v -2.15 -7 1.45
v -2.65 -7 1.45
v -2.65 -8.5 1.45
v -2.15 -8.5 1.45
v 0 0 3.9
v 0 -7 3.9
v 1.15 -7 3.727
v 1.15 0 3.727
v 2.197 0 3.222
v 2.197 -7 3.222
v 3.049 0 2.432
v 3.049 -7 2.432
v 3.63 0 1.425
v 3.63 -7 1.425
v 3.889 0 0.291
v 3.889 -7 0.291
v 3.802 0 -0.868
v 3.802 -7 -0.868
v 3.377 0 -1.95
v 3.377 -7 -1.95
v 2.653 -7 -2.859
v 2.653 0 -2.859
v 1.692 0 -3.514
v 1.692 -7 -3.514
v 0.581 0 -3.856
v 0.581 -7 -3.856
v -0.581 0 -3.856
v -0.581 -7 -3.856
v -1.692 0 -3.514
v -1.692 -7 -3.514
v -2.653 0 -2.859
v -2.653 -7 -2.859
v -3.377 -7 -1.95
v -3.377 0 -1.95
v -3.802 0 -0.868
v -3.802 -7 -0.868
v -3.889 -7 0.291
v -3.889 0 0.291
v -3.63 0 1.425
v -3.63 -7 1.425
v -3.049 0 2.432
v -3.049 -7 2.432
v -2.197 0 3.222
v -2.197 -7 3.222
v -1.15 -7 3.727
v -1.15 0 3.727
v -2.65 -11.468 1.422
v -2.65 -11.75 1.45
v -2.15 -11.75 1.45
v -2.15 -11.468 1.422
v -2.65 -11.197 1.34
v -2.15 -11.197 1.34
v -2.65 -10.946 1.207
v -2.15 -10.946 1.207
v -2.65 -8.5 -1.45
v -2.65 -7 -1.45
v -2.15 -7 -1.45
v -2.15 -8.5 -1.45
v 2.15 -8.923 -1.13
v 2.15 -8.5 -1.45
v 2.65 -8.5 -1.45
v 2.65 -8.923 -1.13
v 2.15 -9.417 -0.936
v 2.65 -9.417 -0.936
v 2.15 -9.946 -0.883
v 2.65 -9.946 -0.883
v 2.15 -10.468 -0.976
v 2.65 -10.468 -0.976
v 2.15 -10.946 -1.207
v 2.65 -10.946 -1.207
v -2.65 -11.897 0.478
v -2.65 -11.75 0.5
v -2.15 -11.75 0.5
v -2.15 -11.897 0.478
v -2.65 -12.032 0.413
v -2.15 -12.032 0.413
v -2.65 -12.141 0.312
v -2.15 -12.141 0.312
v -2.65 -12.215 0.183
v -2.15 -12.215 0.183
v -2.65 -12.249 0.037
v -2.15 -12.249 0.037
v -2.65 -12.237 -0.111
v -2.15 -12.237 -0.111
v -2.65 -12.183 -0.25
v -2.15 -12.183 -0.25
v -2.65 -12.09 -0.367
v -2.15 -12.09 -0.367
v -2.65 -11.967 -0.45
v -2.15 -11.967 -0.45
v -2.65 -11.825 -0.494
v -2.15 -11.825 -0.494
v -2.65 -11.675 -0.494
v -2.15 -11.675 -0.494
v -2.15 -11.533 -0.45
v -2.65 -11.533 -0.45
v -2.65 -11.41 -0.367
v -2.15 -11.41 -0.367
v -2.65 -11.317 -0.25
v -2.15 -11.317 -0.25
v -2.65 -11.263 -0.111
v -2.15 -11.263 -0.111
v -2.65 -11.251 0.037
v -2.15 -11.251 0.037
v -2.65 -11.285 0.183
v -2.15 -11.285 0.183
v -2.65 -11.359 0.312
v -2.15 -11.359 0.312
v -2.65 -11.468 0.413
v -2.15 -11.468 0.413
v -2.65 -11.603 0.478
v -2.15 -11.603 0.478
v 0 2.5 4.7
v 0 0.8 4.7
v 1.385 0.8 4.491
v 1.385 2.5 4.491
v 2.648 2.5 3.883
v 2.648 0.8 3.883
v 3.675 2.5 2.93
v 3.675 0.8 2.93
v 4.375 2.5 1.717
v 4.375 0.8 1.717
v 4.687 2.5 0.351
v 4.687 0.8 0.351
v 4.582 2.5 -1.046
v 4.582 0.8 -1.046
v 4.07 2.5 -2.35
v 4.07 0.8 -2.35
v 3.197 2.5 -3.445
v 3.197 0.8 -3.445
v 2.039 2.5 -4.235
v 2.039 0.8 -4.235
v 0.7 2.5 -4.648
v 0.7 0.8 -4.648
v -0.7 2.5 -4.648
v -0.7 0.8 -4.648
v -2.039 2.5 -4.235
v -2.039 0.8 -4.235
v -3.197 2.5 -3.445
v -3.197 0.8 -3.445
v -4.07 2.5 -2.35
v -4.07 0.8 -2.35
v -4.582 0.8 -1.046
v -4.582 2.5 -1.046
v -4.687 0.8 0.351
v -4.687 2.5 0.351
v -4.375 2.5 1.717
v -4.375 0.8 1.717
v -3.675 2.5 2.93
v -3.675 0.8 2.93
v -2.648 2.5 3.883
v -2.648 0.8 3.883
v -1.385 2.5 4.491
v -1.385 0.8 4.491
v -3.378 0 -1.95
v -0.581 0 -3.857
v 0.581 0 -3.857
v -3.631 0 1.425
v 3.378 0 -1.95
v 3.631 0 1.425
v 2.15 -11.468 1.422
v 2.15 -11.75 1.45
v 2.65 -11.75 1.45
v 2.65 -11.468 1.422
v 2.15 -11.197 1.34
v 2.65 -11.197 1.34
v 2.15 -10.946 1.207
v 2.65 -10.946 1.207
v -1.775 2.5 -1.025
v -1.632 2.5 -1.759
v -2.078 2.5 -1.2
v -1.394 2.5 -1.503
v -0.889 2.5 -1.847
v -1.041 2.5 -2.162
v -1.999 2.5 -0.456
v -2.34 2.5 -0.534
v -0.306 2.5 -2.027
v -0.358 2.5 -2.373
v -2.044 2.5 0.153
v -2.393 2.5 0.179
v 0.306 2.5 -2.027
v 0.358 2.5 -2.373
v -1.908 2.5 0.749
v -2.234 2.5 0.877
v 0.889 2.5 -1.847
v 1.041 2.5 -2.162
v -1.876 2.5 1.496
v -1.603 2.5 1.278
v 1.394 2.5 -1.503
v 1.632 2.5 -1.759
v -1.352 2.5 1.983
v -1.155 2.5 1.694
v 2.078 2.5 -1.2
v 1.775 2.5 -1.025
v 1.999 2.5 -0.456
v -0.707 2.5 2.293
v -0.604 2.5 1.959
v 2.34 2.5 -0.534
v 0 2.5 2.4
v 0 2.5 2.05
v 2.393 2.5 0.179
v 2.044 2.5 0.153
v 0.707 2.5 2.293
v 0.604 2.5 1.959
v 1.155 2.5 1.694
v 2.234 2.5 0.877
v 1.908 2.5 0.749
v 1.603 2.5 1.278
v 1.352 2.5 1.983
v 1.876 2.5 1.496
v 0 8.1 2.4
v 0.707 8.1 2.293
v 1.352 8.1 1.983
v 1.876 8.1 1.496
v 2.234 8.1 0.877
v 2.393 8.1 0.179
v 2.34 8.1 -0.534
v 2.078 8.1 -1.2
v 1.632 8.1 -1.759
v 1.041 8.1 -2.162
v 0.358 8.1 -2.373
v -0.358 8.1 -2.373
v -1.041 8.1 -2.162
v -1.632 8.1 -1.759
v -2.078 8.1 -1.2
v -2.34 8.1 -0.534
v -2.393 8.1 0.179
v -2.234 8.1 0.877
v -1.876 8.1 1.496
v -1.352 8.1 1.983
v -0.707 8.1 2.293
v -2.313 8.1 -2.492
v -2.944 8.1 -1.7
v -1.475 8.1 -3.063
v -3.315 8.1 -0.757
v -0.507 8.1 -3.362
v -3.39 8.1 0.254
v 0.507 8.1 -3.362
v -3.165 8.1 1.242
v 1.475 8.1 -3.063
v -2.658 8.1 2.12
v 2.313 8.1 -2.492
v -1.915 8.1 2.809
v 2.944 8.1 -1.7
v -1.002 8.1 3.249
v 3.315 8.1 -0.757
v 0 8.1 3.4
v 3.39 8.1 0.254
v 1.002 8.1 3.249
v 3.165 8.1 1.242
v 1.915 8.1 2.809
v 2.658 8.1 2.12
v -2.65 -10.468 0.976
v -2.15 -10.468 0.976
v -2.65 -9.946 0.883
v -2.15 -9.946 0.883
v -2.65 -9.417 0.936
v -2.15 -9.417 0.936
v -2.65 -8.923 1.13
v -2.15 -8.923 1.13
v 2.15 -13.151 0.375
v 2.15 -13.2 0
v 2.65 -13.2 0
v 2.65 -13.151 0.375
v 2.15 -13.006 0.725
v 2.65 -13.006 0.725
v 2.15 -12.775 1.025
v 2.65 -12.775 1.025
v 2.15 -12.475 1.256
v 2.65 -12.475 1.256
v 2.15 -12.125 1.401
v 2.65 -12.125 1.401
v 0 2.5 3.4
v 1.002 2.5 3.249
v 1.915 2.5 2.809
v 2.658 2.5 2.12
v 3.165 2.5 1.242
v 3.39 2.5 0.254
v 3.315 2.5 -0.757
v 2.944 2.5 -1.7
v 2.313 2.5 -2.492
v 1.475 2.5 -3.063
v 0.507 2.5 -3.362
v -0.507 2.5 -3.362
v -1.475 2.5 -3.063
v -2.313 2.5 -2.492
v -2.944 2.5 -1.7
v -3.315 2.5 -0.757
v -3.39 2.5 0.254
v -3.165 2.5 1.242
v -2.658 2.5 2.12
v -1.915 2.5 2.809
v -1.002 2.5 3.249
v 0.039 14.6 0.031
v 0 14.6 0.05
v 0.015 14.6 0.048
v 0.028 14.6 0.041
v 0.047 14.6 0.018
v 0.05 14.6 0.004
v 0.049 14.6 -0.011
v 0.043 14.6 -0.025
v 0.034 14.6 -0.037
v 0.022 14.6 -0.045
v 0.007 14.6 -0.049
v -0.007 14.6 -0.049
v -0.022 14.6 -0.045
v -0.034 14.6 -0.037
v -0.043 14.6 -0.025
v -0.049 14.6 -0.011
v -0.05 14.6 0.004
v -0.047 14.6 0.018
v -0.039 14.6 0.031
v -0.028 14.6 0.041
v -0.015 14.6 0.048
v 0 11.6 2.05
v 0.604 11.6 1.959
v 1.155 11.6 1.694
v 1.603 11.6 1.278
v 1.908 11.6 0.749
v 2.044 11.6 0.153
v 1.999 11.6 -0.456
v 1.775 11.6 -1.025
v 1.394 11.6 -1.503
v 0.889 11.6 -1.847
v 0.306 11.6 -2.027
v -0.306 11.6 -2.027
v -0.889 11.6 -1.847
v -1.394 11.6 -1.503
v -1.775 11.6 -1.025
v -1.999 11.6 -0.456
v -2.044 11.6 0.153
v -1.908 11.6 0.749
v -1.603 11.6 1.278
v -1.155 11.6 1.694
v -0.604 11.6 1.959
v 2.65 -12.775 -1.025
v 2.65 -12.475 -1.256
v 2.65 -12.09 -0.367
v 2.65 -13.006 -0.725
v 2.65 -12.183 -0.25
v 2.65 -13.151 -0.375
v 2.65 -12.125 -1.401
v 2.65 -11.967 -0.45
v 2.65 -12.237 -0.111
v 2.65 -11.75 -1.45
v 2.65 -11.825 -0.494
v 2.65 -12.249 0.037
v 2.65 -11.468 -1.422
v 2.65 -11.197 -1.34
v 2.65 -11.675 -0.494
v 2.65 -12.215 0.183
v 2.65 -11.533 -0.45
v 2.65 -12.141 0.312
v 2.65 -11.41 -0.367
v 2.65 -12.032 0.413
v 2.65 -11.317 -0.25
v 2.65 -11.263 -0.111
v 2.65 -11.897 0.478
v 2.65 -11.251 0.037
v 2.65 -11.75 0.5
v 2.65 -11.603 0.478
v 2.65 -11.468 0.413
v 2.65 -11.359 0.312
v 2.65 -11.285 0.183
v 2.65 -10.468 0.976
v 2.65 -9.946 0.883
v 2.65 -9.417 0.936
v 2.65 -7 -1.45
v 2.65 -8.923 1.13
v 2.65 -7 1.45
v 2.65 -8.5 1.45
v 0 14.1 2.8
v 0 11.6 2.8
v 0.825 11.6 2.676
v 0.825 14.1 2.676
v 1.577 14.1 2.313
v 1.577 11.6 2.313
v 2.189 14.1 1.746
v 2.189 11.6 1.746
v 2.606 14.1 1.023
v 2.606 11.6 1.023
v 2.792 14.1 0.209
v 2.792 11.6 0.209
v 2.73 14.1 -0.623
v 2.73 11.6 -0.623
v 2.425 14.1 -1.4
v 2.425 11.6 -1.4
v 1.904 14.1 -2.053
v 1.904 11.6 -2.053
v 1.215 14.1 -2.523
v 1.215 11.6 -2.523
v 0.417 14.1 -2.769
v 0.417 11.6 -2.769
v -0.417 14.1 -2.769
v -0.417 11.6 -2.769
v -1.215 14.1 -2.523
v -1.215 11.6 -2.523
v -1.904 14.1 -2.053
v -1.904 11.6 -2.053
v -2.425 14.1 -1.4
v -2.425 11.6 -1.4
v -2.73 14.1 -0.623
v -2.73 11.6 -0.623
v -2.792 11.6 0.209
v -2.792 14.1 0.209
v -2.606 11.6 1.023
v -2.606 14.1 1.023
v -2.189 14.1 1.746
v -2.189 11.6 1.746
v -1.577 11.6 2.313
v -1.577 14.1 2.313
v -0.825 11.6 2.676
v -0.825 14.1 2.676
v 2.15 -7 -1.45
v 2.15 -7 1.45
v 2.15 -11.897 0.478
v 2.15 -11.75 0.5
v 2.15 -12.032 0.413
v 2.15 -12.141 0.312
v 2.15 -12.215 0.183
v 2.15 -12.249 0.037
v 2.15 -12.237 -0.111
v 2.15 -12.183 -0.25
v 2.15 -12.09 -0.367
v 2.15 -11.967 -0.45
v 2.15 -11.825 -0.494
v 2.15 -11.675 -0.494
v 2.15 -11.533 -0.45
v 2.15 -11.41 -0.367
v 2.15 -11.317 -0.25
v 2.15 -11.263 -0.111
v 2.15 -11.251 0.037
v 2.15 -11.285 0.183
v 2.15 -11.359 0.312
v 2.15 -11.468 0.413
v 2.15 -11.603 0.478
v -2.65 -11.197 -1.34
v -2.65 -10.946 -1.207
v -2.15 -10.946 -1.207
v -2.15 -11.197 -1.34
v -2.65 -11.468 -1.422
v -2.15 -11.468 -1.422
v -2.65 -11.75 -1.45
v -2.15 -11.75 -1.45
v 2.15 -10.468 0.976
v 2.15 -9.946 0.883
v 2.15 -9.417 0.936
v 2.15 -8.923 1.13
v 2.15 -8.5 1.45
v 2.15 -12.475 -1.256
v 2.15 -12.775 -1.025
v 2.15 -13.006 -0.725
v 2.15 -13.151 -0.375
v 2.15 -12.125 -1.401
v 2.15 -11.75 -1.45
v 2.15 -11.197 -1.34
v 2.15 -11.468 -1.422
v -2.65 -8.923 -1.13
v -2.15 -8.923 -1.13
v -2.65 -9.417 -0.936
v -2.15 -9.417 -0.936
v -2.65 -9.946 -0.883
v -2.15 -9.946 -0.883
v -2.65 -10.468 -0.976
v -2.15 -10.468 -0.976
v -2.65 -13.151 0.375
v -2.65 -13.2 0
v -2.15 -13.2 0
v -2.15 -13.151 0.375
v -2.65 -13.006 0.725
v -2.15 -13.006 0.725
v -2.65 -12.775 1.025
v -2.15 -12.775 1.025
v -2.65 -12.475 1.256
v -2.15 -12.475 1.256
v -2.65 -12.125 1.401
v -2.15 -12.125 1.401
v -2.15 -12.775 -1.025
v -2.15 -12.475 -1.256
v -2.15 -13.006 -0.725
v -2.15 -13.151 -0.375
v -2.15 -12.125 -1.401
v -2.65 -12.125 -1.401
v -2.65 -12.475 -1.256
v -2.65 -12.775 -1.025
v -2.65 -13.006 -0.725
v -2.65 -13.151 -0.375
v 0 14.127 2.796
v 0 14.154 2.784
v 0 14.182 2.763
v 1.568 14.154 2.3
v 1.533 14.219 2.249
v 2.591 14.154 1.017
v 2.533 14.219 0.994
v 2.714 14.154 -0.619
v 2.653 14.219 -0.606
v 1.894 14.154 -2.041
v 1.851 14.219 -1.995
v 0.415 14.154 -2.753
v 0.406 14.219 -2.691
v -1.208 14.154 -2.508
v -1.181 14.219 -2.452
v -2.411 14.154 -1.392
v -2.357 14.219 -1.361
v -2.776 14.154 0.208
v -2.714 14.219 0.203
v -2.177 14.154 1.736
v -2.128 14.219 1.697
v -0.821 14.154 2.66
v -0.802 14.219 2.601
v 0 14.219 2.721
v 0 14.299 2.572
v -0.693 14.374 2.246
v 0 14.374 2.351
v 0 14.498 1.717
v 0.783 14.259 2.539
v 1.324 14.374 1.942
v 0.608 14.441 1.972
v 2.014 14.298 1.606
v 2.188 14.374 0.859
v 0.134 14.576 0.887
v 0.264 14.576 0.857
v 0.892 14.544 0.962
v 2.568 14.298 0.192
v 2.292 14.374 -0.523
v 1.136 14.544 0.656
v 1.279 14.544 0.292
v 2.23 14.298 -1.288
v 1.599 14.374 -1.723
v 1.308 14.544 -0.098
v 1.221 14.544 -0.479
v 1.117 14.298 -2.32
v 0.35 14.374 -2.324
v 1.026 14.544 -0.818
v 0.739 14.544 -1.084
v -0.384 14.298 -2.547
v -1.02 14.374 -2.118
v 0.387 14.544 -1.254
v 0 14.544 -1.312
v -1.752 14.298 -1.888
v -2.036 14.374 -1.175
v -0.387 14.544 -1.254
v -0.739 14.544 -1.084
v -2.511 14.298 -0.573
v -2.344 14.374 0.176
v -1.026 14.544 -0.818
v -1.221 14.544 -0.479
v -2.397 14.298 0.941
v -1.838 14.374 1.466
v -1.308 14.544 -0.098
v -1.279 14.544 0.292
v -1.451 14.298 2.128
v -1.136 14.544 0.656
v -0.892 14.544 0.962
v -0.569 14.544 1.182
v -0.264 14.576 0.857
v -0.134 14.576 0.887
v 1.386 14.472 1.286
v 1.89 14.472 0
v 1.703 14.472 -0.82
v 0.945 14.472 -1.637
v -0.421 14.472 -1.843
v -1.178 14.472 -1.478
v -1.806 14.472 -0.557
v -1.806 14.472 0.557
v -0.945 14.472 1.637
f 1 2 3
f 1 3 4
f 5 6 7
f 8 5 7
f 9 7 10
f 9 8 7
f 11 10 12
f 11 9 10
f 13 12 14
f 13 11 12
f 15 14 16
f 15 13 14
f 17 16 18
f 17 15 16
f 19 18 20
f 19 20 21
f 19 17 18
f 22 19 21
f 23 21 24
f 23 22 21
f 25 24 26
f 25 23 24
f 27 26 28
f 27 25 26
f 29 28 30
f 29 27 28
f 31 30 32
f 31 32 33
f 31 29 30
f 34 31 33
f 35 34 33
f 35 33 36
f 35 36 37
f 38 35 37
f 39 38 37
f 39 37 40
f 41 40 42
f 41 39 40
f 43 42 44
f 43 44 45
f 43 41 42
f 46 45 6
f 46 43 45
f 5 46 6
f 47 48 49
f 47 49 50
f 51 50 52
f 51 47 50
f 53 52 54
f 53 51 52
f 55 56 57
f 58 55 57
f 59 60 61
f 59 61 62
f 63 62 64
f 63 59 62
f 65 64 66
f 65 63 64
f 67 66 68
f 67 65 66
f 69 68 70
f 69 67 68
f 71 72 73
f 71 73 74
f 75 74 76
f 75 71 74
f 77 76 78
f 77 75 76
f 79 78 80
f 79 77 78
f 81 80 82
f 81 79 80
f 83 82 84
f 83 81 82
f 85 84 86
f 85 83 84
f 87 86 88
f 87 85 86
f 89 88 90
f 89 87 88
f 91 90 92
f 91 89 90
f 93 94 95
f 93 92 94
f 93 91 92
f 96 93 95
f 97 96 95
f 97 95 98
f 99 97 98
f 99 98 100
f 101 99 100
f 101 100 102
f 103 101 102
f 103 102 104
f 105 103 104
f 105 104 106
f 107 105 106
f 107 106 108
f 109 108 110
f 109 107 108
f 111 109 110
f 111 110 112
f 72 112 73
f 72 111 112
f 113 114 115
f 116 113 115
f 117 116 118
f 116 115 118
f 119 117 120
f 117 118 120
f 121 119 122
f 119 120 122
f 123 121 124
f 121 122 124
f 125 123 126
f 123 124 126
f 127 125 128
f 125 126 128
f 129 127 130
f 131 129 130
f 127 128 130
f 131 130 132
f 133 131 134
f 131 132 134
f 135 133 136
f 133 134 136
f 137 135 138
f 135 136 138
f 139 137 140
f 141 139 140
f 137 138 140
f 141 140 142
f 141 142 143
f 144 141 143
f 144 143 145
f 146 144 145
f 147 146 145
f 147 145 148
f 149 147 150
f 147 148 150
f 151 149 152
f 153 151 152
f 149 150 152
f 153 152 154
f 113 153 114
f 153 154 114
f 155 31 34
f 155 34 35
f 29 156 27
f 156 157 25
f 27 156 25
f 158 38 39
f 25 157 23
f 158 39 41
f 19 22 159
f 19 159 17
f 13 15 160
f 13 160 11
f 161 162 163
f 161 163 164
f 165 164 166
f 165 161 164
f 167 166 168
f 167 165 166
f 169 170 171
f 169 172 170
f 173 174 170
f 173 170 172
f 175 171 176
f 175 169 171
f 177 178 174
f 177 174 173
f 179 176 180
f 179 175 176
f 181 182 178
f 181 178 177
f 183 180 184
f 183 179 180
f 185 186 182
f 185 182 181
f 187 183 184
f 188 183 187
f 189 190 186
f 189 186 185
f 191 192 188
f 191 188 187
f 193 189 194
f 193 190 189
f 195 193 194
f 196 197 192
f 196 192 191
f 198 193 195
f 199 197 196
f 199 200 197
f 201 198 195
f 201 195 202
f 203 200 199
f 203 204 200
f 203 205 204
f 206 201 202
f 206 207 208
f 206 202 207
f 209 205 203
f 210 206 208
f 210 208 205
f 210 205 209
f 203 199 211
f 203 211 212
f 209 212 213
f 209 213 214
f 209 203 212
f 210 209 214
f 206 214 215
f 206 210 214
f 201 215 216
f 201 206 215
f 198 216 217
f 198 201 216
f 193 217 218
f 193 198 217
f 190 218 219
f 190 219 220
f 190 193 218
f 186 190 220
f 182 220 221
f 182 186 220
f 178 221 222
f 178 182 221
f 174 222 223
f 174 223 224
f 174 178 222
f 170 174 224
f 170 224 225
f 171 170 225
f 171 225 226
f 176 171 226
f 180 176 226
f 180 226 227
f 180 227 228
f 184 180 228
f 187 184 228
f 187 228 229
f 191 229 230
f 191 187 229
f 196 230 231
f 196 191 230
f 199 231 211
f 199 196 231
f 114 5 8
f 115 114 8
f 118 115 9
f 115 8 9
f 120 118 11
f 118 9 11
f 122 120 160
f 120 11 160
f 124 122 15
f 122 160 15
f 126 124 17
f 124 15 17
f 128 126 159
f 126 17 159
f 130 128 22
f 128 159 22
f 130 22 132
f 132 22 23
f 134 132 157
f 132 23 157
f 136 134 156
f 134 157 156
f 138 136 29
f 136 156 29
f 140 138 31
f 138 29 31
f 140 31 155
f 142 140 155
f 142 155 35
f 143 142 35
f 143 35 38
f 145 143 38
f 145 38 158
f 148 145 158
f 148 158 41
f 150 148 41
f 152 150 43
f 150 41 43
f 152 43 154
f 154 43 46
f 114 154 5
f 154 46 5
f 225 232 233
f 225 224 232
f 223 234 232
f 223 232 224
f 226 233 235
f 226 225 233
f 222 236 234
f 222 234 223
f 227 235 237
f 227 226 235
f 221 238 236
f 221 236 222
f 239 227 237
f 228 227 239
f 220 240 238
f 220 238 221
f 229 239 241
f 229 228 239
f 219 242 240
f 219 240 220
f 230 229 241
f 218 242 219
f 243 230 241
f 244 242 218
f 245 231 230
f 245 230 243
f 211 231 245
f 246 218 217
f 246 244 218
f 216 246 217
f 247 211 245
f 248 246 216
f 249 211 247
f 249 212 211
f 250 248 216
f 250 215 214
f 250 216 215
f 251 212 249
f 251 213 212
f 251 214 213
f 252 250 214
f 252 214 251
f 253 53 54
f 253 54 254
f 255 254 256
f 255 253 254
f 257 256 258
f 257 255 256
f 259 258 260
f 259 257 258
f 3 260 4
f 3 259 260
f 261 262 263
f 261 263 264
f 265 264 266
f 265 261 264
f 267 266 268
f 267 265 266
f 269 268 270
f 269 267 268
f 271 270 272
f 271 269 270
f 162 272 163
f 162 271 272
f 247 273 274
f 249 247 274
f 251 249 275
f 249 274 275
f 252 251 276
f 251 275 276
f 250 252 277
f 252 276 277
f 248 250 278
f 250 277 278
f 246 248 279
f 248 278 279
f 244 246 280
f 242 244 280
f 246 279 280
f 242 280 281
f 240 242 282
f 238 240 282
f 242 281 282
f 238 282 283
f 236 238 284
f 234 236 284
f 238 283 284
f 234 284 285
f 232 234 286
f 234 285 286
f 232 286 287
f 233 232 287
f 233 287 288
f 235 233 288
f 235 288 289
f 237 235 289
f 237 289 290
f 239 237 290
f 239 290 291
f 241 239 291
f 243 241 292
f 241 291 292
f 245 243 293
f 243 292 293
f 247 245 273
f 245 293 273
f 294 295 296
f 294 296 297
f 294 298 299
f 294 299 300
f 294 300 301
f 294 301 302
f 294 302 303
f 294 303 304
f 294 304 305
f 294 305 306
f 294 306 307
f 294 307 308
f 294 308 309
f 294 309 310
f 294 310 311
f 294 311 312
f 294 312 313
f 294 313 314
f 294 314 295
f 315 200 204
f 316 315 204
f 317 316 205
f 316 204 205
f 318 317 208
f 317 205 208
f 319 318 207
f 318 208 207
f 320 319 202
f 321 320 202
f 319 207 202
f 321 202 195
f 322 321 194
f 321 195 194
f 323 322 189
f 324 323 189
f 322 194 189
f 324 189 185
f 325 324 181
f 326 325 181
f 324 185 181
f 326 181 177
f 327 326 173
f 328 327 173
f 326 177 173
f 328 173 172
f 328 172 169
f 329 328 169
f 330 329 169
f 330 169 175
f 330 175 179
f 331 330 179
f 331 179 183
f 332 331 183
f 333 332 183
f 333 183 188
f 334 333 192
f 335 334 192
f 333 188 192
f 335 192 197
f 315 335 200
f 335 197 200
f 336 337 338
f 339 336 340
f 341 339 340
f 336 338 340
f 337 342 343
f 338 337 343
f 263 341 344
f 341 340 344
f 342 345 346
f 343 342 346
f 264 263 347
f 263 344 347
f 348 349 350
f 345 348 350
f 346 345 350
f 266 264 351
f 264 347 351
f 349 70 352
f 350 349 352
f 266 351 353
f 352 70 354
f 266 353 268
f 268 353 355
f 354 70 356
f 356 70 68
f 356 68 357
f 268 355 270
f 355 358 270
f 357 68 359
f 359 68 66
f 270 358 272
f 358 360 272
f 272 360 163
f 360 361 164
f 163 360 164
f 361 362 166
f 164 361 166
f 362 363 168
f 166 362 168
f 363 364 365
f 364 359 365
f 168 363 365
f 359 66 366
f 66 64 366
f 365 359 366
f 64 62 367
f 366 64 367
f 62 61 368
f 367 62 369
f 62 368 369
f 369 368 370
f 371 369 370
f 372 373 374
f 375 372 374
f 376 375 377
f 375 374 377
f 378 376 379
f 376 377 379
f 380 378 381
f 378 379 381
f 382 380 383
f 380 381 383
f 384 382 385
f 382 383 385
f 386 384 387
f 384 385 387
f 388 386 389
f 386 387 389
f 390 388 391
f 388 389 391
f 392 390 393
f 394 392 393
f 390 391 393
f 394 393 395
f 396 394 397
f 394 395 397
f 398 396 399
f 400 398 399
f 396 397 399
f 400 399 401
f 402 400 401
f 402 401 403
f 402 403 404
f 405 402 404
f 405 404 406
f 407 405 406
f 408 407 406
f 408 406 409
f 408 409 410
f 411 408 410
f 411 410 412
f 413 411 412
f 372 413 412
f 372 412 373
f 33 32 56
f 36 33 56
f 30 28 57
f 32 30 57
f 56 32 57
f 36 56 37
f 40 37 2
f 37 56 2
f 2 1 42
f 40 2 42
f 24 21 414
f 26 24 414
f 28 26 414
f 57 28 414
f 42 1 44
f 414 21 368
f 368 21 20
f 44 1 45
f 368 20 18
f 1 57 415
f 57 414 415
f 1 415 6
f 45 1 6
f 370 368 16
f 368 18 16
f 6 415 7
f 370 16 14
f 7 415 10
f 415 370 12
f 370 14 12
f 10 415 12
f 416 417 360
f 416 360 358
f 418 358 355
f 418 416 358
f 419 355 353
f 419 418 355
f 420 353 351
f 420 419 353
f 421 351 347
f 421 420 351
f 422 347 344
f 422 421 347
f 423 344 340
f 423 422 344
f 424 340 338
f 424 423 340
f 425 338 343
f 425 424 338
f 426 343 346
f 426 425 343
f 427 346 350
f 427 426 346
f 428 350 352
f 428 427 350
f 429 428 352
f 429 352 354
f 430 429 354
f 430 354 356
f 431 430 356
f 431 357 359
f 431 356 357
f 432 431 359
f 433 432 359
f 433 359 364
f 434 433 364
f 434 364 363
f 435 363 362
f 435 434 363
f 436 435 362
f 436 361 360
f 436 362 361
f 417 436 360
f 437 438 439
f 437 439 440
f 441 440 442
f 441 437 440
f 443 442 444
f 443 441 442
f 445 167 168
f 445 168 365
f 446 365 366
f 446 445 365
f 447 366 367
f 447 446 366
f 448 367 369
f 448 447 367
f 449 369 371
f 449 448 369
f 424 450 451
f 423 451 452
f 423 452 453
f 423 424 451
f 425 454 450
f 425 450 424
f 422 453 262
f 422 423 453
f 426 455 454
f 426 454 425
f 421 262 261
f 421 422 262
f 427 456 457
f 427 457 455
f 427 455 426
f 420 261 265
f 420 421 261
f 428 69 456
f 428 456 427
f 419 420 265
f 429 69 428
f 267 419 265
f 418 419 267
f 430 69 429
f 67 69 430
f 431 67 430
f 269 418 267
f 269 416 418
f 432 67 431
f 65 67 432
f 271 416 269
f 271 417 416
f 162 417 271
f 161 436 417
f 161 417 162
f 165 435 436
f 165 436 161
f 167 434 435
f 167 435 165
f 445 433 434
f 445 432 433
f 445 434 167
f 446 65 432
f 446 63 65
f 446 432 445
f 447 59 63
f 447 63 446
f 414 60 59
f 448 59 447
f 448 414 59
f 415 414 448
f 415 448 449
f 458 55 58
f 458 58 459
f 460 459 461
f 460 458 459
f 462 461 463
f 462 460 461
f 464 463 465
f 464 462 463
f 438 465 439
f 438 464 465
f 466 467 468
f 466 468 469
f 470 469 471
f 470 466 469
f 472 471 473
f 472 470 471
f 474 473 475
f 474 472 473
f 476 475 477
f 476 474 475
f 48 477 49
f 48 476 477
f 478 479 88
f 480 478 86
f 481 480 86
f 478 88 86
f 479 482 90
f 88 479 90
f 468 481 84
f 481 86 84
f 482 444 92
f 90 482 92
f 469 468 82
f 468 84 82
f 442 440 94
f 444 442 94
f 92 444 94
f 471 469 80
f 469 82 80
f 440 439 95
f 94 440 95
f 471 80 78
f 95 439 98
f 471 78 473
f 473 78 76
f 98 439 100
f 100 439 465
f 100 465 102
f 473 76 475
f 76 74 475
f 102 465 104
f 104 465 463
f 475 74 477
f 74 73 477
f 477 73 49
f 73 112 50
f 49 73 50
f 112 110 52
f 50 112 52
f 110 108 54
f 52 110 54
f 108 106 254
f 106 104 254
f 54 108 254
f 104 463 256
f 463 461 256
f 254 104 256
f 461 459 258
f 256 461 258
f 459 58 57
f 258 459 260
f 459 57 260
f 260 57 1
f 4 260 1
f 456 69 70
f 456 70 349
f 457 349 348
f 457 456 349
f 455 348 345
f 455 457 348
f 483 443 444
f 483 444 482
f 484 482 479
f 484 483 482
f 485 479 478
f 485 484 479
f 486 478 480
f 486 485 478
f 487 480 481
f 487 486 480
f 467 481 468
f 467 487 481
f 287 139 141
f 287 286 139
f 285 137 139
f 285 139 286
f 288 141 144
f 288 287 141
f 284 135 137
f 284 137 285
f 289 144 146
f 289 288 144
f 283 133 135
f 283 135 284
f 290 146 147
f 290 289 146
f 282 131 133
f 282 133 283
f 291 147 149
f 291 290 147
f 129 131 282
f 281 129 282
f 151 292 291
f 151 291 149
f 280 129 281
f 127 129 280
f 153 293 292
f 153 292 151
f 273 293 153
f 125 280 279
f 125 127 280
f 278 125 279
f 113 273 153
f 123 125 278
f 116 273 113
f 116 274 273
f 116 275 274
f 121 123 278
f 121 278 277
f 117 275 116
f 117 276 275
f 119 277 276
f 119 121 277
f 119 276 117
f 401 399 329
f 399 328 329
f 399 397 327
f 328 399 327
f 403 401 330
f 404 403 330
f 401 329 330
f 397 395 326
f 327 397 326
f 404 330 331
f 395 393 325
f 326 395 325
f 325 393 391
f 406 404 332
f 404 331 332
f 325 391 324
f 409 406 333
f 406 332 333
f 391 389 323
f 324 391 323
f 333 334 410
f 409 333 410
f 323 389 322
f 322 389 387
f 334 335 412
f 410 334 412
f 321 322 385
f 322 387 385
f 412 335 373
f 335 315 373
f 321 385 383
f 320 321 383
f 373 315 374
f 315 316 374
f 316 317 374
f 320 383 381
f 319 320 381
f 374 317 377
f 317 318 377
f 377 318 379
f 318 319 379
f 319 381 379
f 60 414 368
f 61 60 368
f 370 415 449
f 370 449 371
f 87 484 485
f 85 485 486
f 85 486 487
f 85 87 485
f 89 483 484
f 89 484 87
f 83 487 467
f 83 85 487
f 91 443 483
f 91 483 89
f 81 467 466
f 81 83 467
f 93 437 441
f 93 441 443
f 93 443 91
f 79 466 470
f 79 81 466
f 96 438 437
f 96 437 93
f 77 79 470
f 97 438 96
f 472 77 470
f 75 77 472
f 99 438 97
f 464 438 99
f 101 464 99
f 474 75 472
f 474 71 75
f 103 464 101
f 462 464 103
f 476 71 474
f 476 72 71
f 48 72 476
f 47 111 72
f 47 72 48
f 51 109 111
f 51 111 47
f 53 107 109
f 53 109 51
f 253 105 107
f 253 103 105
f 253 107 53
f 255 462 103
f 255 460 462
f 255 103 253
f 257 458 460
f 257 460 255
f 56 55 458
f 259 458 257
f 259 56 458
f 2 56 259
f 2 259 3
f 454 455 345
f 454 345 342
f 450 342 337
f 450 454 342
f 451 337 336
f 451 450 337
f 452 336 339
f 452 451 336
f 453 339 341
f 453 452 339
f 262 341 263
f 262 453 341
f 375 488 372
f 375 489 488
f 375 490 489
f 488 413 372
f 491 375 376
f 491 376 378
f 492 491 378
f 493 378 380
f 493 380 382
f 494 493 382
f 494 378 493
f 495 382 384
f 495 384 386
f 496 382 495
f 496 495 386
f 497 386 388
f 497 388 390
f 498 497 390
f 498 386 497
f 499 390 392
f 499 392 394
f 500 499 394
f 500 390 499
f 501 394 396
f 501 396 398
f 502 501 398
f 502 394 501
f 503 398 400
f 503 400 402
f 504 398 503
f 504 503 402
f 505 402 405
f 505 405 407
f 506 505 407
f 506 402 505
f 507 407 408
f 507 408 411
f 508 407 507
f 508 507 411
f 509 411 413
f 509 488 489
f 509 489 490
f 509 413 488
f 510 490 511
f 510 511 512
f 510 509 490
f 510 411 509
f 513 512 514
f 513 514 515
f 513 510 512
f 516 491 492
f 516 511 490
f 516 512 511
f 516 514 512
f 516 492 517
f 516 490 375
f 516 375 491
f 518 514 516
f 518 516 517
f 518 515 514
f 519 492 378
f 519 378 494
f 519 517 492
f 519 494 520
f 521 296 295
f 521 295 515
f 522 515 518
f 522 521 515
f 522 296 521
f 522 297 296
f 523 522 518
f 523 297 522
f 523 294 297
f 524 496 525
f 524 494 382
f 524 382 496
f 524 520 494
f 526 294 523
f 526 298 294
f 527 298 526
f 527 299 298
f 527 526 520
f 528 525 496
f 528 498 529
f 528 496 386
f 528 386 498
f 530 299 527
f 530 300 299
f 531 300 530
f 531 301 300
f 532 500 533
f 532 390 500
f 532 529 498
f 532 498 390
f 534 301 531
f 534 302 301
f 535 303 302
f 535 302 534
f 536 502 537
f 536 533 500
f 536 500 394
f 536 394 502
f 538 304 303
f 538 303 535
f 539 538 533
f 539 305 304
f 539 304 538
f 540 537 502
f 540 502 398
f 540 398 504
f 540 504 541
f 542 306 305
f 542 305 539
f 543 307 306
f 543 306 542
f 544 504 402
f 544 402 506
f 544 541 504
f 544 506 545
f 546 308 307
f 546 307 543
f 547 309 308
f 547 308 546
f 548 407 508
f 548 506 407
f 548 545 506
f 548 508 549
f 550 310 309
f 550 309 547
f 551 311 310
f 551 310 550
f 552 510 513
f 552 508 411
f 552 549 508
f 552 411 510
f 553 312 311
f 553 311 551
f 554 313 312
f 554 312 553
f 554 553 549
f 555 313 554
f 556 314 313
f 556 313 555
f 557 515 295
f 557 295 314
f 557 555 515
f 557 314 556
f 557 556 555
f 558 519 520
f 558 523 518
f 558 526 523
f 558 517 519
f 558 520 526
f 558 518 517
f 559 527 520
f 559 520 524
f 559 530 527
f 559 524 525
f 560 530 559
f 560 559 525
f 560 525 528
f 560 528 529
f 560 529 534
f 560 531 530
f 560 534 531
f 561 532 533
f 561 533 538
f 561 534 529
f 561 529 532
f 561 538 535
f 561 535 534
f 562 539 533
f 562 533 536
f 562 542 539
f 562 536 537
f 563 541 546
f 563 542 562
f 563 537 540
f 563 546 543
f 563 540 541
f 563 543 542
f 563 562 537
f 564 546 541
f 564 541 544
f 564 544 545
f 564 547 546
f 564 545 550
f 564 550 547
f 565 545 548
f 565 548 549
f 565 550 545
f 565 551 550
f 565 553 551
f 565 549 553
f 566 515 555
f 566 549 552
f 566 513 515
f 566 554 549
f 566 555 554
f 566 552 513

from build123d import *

# Parameters (mm, degrees)
SKETCH1_R               = 3.9
BOSS_EXTRUDE1_DEPTH     = 7
SKETCH2_R               = 4.7
BOSS_EXTRUDE2_DEPTH     = 2.5
CHAMFER1_SIZE           = 0.8
SKETCH3_R               = 3.4
SKETCH3_R_2             = 2.4
BOSS_EXTRUDE3_DEPTH     = 5.6
SKETCH4_R               = 2.05
BOSS_EXTRUDE4_DEPTH     = 9.1
SKETCH5_R               = 2.8
BOSS_EXTRUDE5_DEPTH     = 3
FILLET1_SIZE            = 0.5
FILLET1_SIZE_2          = 2.75
SKETCH6_W               = 0.5
SKETCH6_H               = 2.9
BOSS_EXTRUDE6_DEPTH     = 6.2
CUT_EXTRUDE1_DEPTH      = 6.2
CUT_EXTRUDE1_DEPTH_BACK = 6.2
SKETCH7_R               = 0.5


# Some blends are built 0.0001 mm under size
with BuildPart() as part:
    # Sketch1 → Boss-Extrude1 (new body)
    with BuildSketch(Plane(origin=(0, 0, 0), x_dir=(1, 0, 0), z_dir=(0, 1, 0))):
        with Locations(Location((0, 0, 0), (0, 0, 270))):
            Circle(SKETCH1_R)
    extrude(amount=-BOSS_EXTRUDE1_DEPTH)

    # Sketch2 → Boss-Extrude2 (add)
    with BuildSketch(Plane(origin=(0, 0, 0), x_dir=(1, 0, 0), z_dir=(0, 1, 0))):
        with Locations(Location((0, 0, 0), (0, 0, 270))):
            Circle(SKETCH2_R)
    extrude(amount=BOSS_EXTRUDE2_DEPTH)

    # Chamfer1
    chamfer1_edges = [part.edges().sort_by_distance(p)[0] for p in [
        (0, 0, -4.7),
    ]]
    chamfer(chamfer1_edges, length=CHAMFER1_SIZE - 0.0001)  # a hair under: the kernel refuses the full size

    # Sketch3 → Boss-Extrude3 (add)
    with BuildSketch(Plane(origin=(0, 2.5, 0), x_dir=(1, 0, 0), z_dir=(0, 1, 0))):
        with Locations(Location((0, 0, 0), (0, 0, 270))):
            Circle(SKETCH3_R)
        with Locations(Location((0, 0, 0), (0, 0, 270))):
            Circle(SKETCH3_R_2, mode=Mode.SUBTRACT)
    extrude(amount=BOSS_EXTRUDE3_DEPTH)

    # Sketch4 → Boss-Extrude4 (add)
    with BuildSketch(Plane(origin=(0, 2.5, 0), x_dir=(1, 0, 0), z_dir=(0, 1, 0))):
        with Locations(Location((0, 0, 0), (0, 0, 270))):
            Circle(SKETCH4_R)
    extrude(amount=BOSS_EXTRUDE4_DEPTH)

    # Sketch5 → Boss-Extrude5 (add)
    with BuildSketch(Plane(origin=(0, 11.6, 0), x_dir=(1, 0, 0), z_dir=(0, 1, 0))):
        with Locations(Location((0, 0, 0), (0, 0, 270))):
            Circle(SKETCH5_R)
    extrude(amount=BOSS_EXTRUDE5_DEPTH)

    # Fillet1
    # an asymmetric fillet: 2.75, 0.5 mm, written as the material it takes off along each edge
    with BuildSketch(Plane(origin=(0, 14.6, 0), x_dir=(0, 0, 1), z_dir=(-1, 0, 0))) as fillet1_piece_1:
        with BuildLine():
            Bezier((2.8, -FILLET1_SIZE), (2.8, 0), (2.8 - FILLET1_SIZE_2, 0), weights=[1, 0.707106781, 1])
            Line((2.8 - FILLET1_SIZE_2, 0), (2.8, 0))
            Line((2.8, 0), (2.8, -FILLET1_SIZE))
        make_face()
    revolve(axis=Axis((0, 14.6, 0), (0, 1, 0)), mode=Mode.SUBTRACT)

    # Sketch6 → Boss-Extrude6 (add)
    with BuildSketch(Plane.XZ.offset(7)):
        with Locations((-2.4, 0)):
            Rectangle(SKETCH6_W, SKETCH6_H)
        with Locations((2.4, 0)):
            Rectangle(SKETCH6_W, SKETCH6_H)
    extrude(amount=BOSS_EXTRUDE6_DEPTH)

    # Sketch7 → Cut-Extrude1 (cut, two sides: drawn at the far end of the back side and taken through both)
    with BuildSketch(Plane(origin=(0, 0, 0), x_dir=(0, 0, -1), z_dir=(1, 0, 0)).offset(-CUT_EXTRUDE1_DEPTH_BACK)):
        with BuildLine():
            ThreePointArc((-1.206978138, -10.946443049), (-0.891390932, -9.679801587), (-1.45, -8.5))
            Line((-1.45, -8.5), (-1.45, -11.75))
            ThreePointArc((-1.45, -11.75), (-1.387915397, -11.330249062), (-1.206978138, -10.946443049))
        make_face()
        with BuildLine():
            ThreePointArc((1.45, -11.749999997), (1.025304834, -12.775304832), (0, -13.2))
            Line((0, -13.2), (1.45, -13.2))
            Line((1.45, -13.2), (1.45, -11.749999997))
        make_face()
        with BuildLine():
            ThreePointArc((0, -13.2), (-1.025304833, -12.775304833), (-1.45, -11.75))
            Line((-1.45, -11.75), (-1.45, -13.2))
            Line((-1.45, -13.2), (0, -13.2))
        make_face()
        with BuildLine():
            ThreePointArc((1.206978138, -10.946443049), (1.387915397, -11.330249061), (1.45, -11.749999997))
            Line((1.45, -11.749999997), (1.45, -8.5))
            ThreePointArc((1.45, -8.5), (0.891390932, -9.679801587), (1.206978138, -10.946443049))
        make_face()
        with Locations(Location((0, -11.75, 0), (0, 0, 180))):
            Circle(SKETCH7_R)
    extrude(amount=CUT_EXTRUDE1_DEPTH + CUT_EXTRUDE1_DEPTH_BACK, mode=Mode.SUBTRACT)


solid = part.part
